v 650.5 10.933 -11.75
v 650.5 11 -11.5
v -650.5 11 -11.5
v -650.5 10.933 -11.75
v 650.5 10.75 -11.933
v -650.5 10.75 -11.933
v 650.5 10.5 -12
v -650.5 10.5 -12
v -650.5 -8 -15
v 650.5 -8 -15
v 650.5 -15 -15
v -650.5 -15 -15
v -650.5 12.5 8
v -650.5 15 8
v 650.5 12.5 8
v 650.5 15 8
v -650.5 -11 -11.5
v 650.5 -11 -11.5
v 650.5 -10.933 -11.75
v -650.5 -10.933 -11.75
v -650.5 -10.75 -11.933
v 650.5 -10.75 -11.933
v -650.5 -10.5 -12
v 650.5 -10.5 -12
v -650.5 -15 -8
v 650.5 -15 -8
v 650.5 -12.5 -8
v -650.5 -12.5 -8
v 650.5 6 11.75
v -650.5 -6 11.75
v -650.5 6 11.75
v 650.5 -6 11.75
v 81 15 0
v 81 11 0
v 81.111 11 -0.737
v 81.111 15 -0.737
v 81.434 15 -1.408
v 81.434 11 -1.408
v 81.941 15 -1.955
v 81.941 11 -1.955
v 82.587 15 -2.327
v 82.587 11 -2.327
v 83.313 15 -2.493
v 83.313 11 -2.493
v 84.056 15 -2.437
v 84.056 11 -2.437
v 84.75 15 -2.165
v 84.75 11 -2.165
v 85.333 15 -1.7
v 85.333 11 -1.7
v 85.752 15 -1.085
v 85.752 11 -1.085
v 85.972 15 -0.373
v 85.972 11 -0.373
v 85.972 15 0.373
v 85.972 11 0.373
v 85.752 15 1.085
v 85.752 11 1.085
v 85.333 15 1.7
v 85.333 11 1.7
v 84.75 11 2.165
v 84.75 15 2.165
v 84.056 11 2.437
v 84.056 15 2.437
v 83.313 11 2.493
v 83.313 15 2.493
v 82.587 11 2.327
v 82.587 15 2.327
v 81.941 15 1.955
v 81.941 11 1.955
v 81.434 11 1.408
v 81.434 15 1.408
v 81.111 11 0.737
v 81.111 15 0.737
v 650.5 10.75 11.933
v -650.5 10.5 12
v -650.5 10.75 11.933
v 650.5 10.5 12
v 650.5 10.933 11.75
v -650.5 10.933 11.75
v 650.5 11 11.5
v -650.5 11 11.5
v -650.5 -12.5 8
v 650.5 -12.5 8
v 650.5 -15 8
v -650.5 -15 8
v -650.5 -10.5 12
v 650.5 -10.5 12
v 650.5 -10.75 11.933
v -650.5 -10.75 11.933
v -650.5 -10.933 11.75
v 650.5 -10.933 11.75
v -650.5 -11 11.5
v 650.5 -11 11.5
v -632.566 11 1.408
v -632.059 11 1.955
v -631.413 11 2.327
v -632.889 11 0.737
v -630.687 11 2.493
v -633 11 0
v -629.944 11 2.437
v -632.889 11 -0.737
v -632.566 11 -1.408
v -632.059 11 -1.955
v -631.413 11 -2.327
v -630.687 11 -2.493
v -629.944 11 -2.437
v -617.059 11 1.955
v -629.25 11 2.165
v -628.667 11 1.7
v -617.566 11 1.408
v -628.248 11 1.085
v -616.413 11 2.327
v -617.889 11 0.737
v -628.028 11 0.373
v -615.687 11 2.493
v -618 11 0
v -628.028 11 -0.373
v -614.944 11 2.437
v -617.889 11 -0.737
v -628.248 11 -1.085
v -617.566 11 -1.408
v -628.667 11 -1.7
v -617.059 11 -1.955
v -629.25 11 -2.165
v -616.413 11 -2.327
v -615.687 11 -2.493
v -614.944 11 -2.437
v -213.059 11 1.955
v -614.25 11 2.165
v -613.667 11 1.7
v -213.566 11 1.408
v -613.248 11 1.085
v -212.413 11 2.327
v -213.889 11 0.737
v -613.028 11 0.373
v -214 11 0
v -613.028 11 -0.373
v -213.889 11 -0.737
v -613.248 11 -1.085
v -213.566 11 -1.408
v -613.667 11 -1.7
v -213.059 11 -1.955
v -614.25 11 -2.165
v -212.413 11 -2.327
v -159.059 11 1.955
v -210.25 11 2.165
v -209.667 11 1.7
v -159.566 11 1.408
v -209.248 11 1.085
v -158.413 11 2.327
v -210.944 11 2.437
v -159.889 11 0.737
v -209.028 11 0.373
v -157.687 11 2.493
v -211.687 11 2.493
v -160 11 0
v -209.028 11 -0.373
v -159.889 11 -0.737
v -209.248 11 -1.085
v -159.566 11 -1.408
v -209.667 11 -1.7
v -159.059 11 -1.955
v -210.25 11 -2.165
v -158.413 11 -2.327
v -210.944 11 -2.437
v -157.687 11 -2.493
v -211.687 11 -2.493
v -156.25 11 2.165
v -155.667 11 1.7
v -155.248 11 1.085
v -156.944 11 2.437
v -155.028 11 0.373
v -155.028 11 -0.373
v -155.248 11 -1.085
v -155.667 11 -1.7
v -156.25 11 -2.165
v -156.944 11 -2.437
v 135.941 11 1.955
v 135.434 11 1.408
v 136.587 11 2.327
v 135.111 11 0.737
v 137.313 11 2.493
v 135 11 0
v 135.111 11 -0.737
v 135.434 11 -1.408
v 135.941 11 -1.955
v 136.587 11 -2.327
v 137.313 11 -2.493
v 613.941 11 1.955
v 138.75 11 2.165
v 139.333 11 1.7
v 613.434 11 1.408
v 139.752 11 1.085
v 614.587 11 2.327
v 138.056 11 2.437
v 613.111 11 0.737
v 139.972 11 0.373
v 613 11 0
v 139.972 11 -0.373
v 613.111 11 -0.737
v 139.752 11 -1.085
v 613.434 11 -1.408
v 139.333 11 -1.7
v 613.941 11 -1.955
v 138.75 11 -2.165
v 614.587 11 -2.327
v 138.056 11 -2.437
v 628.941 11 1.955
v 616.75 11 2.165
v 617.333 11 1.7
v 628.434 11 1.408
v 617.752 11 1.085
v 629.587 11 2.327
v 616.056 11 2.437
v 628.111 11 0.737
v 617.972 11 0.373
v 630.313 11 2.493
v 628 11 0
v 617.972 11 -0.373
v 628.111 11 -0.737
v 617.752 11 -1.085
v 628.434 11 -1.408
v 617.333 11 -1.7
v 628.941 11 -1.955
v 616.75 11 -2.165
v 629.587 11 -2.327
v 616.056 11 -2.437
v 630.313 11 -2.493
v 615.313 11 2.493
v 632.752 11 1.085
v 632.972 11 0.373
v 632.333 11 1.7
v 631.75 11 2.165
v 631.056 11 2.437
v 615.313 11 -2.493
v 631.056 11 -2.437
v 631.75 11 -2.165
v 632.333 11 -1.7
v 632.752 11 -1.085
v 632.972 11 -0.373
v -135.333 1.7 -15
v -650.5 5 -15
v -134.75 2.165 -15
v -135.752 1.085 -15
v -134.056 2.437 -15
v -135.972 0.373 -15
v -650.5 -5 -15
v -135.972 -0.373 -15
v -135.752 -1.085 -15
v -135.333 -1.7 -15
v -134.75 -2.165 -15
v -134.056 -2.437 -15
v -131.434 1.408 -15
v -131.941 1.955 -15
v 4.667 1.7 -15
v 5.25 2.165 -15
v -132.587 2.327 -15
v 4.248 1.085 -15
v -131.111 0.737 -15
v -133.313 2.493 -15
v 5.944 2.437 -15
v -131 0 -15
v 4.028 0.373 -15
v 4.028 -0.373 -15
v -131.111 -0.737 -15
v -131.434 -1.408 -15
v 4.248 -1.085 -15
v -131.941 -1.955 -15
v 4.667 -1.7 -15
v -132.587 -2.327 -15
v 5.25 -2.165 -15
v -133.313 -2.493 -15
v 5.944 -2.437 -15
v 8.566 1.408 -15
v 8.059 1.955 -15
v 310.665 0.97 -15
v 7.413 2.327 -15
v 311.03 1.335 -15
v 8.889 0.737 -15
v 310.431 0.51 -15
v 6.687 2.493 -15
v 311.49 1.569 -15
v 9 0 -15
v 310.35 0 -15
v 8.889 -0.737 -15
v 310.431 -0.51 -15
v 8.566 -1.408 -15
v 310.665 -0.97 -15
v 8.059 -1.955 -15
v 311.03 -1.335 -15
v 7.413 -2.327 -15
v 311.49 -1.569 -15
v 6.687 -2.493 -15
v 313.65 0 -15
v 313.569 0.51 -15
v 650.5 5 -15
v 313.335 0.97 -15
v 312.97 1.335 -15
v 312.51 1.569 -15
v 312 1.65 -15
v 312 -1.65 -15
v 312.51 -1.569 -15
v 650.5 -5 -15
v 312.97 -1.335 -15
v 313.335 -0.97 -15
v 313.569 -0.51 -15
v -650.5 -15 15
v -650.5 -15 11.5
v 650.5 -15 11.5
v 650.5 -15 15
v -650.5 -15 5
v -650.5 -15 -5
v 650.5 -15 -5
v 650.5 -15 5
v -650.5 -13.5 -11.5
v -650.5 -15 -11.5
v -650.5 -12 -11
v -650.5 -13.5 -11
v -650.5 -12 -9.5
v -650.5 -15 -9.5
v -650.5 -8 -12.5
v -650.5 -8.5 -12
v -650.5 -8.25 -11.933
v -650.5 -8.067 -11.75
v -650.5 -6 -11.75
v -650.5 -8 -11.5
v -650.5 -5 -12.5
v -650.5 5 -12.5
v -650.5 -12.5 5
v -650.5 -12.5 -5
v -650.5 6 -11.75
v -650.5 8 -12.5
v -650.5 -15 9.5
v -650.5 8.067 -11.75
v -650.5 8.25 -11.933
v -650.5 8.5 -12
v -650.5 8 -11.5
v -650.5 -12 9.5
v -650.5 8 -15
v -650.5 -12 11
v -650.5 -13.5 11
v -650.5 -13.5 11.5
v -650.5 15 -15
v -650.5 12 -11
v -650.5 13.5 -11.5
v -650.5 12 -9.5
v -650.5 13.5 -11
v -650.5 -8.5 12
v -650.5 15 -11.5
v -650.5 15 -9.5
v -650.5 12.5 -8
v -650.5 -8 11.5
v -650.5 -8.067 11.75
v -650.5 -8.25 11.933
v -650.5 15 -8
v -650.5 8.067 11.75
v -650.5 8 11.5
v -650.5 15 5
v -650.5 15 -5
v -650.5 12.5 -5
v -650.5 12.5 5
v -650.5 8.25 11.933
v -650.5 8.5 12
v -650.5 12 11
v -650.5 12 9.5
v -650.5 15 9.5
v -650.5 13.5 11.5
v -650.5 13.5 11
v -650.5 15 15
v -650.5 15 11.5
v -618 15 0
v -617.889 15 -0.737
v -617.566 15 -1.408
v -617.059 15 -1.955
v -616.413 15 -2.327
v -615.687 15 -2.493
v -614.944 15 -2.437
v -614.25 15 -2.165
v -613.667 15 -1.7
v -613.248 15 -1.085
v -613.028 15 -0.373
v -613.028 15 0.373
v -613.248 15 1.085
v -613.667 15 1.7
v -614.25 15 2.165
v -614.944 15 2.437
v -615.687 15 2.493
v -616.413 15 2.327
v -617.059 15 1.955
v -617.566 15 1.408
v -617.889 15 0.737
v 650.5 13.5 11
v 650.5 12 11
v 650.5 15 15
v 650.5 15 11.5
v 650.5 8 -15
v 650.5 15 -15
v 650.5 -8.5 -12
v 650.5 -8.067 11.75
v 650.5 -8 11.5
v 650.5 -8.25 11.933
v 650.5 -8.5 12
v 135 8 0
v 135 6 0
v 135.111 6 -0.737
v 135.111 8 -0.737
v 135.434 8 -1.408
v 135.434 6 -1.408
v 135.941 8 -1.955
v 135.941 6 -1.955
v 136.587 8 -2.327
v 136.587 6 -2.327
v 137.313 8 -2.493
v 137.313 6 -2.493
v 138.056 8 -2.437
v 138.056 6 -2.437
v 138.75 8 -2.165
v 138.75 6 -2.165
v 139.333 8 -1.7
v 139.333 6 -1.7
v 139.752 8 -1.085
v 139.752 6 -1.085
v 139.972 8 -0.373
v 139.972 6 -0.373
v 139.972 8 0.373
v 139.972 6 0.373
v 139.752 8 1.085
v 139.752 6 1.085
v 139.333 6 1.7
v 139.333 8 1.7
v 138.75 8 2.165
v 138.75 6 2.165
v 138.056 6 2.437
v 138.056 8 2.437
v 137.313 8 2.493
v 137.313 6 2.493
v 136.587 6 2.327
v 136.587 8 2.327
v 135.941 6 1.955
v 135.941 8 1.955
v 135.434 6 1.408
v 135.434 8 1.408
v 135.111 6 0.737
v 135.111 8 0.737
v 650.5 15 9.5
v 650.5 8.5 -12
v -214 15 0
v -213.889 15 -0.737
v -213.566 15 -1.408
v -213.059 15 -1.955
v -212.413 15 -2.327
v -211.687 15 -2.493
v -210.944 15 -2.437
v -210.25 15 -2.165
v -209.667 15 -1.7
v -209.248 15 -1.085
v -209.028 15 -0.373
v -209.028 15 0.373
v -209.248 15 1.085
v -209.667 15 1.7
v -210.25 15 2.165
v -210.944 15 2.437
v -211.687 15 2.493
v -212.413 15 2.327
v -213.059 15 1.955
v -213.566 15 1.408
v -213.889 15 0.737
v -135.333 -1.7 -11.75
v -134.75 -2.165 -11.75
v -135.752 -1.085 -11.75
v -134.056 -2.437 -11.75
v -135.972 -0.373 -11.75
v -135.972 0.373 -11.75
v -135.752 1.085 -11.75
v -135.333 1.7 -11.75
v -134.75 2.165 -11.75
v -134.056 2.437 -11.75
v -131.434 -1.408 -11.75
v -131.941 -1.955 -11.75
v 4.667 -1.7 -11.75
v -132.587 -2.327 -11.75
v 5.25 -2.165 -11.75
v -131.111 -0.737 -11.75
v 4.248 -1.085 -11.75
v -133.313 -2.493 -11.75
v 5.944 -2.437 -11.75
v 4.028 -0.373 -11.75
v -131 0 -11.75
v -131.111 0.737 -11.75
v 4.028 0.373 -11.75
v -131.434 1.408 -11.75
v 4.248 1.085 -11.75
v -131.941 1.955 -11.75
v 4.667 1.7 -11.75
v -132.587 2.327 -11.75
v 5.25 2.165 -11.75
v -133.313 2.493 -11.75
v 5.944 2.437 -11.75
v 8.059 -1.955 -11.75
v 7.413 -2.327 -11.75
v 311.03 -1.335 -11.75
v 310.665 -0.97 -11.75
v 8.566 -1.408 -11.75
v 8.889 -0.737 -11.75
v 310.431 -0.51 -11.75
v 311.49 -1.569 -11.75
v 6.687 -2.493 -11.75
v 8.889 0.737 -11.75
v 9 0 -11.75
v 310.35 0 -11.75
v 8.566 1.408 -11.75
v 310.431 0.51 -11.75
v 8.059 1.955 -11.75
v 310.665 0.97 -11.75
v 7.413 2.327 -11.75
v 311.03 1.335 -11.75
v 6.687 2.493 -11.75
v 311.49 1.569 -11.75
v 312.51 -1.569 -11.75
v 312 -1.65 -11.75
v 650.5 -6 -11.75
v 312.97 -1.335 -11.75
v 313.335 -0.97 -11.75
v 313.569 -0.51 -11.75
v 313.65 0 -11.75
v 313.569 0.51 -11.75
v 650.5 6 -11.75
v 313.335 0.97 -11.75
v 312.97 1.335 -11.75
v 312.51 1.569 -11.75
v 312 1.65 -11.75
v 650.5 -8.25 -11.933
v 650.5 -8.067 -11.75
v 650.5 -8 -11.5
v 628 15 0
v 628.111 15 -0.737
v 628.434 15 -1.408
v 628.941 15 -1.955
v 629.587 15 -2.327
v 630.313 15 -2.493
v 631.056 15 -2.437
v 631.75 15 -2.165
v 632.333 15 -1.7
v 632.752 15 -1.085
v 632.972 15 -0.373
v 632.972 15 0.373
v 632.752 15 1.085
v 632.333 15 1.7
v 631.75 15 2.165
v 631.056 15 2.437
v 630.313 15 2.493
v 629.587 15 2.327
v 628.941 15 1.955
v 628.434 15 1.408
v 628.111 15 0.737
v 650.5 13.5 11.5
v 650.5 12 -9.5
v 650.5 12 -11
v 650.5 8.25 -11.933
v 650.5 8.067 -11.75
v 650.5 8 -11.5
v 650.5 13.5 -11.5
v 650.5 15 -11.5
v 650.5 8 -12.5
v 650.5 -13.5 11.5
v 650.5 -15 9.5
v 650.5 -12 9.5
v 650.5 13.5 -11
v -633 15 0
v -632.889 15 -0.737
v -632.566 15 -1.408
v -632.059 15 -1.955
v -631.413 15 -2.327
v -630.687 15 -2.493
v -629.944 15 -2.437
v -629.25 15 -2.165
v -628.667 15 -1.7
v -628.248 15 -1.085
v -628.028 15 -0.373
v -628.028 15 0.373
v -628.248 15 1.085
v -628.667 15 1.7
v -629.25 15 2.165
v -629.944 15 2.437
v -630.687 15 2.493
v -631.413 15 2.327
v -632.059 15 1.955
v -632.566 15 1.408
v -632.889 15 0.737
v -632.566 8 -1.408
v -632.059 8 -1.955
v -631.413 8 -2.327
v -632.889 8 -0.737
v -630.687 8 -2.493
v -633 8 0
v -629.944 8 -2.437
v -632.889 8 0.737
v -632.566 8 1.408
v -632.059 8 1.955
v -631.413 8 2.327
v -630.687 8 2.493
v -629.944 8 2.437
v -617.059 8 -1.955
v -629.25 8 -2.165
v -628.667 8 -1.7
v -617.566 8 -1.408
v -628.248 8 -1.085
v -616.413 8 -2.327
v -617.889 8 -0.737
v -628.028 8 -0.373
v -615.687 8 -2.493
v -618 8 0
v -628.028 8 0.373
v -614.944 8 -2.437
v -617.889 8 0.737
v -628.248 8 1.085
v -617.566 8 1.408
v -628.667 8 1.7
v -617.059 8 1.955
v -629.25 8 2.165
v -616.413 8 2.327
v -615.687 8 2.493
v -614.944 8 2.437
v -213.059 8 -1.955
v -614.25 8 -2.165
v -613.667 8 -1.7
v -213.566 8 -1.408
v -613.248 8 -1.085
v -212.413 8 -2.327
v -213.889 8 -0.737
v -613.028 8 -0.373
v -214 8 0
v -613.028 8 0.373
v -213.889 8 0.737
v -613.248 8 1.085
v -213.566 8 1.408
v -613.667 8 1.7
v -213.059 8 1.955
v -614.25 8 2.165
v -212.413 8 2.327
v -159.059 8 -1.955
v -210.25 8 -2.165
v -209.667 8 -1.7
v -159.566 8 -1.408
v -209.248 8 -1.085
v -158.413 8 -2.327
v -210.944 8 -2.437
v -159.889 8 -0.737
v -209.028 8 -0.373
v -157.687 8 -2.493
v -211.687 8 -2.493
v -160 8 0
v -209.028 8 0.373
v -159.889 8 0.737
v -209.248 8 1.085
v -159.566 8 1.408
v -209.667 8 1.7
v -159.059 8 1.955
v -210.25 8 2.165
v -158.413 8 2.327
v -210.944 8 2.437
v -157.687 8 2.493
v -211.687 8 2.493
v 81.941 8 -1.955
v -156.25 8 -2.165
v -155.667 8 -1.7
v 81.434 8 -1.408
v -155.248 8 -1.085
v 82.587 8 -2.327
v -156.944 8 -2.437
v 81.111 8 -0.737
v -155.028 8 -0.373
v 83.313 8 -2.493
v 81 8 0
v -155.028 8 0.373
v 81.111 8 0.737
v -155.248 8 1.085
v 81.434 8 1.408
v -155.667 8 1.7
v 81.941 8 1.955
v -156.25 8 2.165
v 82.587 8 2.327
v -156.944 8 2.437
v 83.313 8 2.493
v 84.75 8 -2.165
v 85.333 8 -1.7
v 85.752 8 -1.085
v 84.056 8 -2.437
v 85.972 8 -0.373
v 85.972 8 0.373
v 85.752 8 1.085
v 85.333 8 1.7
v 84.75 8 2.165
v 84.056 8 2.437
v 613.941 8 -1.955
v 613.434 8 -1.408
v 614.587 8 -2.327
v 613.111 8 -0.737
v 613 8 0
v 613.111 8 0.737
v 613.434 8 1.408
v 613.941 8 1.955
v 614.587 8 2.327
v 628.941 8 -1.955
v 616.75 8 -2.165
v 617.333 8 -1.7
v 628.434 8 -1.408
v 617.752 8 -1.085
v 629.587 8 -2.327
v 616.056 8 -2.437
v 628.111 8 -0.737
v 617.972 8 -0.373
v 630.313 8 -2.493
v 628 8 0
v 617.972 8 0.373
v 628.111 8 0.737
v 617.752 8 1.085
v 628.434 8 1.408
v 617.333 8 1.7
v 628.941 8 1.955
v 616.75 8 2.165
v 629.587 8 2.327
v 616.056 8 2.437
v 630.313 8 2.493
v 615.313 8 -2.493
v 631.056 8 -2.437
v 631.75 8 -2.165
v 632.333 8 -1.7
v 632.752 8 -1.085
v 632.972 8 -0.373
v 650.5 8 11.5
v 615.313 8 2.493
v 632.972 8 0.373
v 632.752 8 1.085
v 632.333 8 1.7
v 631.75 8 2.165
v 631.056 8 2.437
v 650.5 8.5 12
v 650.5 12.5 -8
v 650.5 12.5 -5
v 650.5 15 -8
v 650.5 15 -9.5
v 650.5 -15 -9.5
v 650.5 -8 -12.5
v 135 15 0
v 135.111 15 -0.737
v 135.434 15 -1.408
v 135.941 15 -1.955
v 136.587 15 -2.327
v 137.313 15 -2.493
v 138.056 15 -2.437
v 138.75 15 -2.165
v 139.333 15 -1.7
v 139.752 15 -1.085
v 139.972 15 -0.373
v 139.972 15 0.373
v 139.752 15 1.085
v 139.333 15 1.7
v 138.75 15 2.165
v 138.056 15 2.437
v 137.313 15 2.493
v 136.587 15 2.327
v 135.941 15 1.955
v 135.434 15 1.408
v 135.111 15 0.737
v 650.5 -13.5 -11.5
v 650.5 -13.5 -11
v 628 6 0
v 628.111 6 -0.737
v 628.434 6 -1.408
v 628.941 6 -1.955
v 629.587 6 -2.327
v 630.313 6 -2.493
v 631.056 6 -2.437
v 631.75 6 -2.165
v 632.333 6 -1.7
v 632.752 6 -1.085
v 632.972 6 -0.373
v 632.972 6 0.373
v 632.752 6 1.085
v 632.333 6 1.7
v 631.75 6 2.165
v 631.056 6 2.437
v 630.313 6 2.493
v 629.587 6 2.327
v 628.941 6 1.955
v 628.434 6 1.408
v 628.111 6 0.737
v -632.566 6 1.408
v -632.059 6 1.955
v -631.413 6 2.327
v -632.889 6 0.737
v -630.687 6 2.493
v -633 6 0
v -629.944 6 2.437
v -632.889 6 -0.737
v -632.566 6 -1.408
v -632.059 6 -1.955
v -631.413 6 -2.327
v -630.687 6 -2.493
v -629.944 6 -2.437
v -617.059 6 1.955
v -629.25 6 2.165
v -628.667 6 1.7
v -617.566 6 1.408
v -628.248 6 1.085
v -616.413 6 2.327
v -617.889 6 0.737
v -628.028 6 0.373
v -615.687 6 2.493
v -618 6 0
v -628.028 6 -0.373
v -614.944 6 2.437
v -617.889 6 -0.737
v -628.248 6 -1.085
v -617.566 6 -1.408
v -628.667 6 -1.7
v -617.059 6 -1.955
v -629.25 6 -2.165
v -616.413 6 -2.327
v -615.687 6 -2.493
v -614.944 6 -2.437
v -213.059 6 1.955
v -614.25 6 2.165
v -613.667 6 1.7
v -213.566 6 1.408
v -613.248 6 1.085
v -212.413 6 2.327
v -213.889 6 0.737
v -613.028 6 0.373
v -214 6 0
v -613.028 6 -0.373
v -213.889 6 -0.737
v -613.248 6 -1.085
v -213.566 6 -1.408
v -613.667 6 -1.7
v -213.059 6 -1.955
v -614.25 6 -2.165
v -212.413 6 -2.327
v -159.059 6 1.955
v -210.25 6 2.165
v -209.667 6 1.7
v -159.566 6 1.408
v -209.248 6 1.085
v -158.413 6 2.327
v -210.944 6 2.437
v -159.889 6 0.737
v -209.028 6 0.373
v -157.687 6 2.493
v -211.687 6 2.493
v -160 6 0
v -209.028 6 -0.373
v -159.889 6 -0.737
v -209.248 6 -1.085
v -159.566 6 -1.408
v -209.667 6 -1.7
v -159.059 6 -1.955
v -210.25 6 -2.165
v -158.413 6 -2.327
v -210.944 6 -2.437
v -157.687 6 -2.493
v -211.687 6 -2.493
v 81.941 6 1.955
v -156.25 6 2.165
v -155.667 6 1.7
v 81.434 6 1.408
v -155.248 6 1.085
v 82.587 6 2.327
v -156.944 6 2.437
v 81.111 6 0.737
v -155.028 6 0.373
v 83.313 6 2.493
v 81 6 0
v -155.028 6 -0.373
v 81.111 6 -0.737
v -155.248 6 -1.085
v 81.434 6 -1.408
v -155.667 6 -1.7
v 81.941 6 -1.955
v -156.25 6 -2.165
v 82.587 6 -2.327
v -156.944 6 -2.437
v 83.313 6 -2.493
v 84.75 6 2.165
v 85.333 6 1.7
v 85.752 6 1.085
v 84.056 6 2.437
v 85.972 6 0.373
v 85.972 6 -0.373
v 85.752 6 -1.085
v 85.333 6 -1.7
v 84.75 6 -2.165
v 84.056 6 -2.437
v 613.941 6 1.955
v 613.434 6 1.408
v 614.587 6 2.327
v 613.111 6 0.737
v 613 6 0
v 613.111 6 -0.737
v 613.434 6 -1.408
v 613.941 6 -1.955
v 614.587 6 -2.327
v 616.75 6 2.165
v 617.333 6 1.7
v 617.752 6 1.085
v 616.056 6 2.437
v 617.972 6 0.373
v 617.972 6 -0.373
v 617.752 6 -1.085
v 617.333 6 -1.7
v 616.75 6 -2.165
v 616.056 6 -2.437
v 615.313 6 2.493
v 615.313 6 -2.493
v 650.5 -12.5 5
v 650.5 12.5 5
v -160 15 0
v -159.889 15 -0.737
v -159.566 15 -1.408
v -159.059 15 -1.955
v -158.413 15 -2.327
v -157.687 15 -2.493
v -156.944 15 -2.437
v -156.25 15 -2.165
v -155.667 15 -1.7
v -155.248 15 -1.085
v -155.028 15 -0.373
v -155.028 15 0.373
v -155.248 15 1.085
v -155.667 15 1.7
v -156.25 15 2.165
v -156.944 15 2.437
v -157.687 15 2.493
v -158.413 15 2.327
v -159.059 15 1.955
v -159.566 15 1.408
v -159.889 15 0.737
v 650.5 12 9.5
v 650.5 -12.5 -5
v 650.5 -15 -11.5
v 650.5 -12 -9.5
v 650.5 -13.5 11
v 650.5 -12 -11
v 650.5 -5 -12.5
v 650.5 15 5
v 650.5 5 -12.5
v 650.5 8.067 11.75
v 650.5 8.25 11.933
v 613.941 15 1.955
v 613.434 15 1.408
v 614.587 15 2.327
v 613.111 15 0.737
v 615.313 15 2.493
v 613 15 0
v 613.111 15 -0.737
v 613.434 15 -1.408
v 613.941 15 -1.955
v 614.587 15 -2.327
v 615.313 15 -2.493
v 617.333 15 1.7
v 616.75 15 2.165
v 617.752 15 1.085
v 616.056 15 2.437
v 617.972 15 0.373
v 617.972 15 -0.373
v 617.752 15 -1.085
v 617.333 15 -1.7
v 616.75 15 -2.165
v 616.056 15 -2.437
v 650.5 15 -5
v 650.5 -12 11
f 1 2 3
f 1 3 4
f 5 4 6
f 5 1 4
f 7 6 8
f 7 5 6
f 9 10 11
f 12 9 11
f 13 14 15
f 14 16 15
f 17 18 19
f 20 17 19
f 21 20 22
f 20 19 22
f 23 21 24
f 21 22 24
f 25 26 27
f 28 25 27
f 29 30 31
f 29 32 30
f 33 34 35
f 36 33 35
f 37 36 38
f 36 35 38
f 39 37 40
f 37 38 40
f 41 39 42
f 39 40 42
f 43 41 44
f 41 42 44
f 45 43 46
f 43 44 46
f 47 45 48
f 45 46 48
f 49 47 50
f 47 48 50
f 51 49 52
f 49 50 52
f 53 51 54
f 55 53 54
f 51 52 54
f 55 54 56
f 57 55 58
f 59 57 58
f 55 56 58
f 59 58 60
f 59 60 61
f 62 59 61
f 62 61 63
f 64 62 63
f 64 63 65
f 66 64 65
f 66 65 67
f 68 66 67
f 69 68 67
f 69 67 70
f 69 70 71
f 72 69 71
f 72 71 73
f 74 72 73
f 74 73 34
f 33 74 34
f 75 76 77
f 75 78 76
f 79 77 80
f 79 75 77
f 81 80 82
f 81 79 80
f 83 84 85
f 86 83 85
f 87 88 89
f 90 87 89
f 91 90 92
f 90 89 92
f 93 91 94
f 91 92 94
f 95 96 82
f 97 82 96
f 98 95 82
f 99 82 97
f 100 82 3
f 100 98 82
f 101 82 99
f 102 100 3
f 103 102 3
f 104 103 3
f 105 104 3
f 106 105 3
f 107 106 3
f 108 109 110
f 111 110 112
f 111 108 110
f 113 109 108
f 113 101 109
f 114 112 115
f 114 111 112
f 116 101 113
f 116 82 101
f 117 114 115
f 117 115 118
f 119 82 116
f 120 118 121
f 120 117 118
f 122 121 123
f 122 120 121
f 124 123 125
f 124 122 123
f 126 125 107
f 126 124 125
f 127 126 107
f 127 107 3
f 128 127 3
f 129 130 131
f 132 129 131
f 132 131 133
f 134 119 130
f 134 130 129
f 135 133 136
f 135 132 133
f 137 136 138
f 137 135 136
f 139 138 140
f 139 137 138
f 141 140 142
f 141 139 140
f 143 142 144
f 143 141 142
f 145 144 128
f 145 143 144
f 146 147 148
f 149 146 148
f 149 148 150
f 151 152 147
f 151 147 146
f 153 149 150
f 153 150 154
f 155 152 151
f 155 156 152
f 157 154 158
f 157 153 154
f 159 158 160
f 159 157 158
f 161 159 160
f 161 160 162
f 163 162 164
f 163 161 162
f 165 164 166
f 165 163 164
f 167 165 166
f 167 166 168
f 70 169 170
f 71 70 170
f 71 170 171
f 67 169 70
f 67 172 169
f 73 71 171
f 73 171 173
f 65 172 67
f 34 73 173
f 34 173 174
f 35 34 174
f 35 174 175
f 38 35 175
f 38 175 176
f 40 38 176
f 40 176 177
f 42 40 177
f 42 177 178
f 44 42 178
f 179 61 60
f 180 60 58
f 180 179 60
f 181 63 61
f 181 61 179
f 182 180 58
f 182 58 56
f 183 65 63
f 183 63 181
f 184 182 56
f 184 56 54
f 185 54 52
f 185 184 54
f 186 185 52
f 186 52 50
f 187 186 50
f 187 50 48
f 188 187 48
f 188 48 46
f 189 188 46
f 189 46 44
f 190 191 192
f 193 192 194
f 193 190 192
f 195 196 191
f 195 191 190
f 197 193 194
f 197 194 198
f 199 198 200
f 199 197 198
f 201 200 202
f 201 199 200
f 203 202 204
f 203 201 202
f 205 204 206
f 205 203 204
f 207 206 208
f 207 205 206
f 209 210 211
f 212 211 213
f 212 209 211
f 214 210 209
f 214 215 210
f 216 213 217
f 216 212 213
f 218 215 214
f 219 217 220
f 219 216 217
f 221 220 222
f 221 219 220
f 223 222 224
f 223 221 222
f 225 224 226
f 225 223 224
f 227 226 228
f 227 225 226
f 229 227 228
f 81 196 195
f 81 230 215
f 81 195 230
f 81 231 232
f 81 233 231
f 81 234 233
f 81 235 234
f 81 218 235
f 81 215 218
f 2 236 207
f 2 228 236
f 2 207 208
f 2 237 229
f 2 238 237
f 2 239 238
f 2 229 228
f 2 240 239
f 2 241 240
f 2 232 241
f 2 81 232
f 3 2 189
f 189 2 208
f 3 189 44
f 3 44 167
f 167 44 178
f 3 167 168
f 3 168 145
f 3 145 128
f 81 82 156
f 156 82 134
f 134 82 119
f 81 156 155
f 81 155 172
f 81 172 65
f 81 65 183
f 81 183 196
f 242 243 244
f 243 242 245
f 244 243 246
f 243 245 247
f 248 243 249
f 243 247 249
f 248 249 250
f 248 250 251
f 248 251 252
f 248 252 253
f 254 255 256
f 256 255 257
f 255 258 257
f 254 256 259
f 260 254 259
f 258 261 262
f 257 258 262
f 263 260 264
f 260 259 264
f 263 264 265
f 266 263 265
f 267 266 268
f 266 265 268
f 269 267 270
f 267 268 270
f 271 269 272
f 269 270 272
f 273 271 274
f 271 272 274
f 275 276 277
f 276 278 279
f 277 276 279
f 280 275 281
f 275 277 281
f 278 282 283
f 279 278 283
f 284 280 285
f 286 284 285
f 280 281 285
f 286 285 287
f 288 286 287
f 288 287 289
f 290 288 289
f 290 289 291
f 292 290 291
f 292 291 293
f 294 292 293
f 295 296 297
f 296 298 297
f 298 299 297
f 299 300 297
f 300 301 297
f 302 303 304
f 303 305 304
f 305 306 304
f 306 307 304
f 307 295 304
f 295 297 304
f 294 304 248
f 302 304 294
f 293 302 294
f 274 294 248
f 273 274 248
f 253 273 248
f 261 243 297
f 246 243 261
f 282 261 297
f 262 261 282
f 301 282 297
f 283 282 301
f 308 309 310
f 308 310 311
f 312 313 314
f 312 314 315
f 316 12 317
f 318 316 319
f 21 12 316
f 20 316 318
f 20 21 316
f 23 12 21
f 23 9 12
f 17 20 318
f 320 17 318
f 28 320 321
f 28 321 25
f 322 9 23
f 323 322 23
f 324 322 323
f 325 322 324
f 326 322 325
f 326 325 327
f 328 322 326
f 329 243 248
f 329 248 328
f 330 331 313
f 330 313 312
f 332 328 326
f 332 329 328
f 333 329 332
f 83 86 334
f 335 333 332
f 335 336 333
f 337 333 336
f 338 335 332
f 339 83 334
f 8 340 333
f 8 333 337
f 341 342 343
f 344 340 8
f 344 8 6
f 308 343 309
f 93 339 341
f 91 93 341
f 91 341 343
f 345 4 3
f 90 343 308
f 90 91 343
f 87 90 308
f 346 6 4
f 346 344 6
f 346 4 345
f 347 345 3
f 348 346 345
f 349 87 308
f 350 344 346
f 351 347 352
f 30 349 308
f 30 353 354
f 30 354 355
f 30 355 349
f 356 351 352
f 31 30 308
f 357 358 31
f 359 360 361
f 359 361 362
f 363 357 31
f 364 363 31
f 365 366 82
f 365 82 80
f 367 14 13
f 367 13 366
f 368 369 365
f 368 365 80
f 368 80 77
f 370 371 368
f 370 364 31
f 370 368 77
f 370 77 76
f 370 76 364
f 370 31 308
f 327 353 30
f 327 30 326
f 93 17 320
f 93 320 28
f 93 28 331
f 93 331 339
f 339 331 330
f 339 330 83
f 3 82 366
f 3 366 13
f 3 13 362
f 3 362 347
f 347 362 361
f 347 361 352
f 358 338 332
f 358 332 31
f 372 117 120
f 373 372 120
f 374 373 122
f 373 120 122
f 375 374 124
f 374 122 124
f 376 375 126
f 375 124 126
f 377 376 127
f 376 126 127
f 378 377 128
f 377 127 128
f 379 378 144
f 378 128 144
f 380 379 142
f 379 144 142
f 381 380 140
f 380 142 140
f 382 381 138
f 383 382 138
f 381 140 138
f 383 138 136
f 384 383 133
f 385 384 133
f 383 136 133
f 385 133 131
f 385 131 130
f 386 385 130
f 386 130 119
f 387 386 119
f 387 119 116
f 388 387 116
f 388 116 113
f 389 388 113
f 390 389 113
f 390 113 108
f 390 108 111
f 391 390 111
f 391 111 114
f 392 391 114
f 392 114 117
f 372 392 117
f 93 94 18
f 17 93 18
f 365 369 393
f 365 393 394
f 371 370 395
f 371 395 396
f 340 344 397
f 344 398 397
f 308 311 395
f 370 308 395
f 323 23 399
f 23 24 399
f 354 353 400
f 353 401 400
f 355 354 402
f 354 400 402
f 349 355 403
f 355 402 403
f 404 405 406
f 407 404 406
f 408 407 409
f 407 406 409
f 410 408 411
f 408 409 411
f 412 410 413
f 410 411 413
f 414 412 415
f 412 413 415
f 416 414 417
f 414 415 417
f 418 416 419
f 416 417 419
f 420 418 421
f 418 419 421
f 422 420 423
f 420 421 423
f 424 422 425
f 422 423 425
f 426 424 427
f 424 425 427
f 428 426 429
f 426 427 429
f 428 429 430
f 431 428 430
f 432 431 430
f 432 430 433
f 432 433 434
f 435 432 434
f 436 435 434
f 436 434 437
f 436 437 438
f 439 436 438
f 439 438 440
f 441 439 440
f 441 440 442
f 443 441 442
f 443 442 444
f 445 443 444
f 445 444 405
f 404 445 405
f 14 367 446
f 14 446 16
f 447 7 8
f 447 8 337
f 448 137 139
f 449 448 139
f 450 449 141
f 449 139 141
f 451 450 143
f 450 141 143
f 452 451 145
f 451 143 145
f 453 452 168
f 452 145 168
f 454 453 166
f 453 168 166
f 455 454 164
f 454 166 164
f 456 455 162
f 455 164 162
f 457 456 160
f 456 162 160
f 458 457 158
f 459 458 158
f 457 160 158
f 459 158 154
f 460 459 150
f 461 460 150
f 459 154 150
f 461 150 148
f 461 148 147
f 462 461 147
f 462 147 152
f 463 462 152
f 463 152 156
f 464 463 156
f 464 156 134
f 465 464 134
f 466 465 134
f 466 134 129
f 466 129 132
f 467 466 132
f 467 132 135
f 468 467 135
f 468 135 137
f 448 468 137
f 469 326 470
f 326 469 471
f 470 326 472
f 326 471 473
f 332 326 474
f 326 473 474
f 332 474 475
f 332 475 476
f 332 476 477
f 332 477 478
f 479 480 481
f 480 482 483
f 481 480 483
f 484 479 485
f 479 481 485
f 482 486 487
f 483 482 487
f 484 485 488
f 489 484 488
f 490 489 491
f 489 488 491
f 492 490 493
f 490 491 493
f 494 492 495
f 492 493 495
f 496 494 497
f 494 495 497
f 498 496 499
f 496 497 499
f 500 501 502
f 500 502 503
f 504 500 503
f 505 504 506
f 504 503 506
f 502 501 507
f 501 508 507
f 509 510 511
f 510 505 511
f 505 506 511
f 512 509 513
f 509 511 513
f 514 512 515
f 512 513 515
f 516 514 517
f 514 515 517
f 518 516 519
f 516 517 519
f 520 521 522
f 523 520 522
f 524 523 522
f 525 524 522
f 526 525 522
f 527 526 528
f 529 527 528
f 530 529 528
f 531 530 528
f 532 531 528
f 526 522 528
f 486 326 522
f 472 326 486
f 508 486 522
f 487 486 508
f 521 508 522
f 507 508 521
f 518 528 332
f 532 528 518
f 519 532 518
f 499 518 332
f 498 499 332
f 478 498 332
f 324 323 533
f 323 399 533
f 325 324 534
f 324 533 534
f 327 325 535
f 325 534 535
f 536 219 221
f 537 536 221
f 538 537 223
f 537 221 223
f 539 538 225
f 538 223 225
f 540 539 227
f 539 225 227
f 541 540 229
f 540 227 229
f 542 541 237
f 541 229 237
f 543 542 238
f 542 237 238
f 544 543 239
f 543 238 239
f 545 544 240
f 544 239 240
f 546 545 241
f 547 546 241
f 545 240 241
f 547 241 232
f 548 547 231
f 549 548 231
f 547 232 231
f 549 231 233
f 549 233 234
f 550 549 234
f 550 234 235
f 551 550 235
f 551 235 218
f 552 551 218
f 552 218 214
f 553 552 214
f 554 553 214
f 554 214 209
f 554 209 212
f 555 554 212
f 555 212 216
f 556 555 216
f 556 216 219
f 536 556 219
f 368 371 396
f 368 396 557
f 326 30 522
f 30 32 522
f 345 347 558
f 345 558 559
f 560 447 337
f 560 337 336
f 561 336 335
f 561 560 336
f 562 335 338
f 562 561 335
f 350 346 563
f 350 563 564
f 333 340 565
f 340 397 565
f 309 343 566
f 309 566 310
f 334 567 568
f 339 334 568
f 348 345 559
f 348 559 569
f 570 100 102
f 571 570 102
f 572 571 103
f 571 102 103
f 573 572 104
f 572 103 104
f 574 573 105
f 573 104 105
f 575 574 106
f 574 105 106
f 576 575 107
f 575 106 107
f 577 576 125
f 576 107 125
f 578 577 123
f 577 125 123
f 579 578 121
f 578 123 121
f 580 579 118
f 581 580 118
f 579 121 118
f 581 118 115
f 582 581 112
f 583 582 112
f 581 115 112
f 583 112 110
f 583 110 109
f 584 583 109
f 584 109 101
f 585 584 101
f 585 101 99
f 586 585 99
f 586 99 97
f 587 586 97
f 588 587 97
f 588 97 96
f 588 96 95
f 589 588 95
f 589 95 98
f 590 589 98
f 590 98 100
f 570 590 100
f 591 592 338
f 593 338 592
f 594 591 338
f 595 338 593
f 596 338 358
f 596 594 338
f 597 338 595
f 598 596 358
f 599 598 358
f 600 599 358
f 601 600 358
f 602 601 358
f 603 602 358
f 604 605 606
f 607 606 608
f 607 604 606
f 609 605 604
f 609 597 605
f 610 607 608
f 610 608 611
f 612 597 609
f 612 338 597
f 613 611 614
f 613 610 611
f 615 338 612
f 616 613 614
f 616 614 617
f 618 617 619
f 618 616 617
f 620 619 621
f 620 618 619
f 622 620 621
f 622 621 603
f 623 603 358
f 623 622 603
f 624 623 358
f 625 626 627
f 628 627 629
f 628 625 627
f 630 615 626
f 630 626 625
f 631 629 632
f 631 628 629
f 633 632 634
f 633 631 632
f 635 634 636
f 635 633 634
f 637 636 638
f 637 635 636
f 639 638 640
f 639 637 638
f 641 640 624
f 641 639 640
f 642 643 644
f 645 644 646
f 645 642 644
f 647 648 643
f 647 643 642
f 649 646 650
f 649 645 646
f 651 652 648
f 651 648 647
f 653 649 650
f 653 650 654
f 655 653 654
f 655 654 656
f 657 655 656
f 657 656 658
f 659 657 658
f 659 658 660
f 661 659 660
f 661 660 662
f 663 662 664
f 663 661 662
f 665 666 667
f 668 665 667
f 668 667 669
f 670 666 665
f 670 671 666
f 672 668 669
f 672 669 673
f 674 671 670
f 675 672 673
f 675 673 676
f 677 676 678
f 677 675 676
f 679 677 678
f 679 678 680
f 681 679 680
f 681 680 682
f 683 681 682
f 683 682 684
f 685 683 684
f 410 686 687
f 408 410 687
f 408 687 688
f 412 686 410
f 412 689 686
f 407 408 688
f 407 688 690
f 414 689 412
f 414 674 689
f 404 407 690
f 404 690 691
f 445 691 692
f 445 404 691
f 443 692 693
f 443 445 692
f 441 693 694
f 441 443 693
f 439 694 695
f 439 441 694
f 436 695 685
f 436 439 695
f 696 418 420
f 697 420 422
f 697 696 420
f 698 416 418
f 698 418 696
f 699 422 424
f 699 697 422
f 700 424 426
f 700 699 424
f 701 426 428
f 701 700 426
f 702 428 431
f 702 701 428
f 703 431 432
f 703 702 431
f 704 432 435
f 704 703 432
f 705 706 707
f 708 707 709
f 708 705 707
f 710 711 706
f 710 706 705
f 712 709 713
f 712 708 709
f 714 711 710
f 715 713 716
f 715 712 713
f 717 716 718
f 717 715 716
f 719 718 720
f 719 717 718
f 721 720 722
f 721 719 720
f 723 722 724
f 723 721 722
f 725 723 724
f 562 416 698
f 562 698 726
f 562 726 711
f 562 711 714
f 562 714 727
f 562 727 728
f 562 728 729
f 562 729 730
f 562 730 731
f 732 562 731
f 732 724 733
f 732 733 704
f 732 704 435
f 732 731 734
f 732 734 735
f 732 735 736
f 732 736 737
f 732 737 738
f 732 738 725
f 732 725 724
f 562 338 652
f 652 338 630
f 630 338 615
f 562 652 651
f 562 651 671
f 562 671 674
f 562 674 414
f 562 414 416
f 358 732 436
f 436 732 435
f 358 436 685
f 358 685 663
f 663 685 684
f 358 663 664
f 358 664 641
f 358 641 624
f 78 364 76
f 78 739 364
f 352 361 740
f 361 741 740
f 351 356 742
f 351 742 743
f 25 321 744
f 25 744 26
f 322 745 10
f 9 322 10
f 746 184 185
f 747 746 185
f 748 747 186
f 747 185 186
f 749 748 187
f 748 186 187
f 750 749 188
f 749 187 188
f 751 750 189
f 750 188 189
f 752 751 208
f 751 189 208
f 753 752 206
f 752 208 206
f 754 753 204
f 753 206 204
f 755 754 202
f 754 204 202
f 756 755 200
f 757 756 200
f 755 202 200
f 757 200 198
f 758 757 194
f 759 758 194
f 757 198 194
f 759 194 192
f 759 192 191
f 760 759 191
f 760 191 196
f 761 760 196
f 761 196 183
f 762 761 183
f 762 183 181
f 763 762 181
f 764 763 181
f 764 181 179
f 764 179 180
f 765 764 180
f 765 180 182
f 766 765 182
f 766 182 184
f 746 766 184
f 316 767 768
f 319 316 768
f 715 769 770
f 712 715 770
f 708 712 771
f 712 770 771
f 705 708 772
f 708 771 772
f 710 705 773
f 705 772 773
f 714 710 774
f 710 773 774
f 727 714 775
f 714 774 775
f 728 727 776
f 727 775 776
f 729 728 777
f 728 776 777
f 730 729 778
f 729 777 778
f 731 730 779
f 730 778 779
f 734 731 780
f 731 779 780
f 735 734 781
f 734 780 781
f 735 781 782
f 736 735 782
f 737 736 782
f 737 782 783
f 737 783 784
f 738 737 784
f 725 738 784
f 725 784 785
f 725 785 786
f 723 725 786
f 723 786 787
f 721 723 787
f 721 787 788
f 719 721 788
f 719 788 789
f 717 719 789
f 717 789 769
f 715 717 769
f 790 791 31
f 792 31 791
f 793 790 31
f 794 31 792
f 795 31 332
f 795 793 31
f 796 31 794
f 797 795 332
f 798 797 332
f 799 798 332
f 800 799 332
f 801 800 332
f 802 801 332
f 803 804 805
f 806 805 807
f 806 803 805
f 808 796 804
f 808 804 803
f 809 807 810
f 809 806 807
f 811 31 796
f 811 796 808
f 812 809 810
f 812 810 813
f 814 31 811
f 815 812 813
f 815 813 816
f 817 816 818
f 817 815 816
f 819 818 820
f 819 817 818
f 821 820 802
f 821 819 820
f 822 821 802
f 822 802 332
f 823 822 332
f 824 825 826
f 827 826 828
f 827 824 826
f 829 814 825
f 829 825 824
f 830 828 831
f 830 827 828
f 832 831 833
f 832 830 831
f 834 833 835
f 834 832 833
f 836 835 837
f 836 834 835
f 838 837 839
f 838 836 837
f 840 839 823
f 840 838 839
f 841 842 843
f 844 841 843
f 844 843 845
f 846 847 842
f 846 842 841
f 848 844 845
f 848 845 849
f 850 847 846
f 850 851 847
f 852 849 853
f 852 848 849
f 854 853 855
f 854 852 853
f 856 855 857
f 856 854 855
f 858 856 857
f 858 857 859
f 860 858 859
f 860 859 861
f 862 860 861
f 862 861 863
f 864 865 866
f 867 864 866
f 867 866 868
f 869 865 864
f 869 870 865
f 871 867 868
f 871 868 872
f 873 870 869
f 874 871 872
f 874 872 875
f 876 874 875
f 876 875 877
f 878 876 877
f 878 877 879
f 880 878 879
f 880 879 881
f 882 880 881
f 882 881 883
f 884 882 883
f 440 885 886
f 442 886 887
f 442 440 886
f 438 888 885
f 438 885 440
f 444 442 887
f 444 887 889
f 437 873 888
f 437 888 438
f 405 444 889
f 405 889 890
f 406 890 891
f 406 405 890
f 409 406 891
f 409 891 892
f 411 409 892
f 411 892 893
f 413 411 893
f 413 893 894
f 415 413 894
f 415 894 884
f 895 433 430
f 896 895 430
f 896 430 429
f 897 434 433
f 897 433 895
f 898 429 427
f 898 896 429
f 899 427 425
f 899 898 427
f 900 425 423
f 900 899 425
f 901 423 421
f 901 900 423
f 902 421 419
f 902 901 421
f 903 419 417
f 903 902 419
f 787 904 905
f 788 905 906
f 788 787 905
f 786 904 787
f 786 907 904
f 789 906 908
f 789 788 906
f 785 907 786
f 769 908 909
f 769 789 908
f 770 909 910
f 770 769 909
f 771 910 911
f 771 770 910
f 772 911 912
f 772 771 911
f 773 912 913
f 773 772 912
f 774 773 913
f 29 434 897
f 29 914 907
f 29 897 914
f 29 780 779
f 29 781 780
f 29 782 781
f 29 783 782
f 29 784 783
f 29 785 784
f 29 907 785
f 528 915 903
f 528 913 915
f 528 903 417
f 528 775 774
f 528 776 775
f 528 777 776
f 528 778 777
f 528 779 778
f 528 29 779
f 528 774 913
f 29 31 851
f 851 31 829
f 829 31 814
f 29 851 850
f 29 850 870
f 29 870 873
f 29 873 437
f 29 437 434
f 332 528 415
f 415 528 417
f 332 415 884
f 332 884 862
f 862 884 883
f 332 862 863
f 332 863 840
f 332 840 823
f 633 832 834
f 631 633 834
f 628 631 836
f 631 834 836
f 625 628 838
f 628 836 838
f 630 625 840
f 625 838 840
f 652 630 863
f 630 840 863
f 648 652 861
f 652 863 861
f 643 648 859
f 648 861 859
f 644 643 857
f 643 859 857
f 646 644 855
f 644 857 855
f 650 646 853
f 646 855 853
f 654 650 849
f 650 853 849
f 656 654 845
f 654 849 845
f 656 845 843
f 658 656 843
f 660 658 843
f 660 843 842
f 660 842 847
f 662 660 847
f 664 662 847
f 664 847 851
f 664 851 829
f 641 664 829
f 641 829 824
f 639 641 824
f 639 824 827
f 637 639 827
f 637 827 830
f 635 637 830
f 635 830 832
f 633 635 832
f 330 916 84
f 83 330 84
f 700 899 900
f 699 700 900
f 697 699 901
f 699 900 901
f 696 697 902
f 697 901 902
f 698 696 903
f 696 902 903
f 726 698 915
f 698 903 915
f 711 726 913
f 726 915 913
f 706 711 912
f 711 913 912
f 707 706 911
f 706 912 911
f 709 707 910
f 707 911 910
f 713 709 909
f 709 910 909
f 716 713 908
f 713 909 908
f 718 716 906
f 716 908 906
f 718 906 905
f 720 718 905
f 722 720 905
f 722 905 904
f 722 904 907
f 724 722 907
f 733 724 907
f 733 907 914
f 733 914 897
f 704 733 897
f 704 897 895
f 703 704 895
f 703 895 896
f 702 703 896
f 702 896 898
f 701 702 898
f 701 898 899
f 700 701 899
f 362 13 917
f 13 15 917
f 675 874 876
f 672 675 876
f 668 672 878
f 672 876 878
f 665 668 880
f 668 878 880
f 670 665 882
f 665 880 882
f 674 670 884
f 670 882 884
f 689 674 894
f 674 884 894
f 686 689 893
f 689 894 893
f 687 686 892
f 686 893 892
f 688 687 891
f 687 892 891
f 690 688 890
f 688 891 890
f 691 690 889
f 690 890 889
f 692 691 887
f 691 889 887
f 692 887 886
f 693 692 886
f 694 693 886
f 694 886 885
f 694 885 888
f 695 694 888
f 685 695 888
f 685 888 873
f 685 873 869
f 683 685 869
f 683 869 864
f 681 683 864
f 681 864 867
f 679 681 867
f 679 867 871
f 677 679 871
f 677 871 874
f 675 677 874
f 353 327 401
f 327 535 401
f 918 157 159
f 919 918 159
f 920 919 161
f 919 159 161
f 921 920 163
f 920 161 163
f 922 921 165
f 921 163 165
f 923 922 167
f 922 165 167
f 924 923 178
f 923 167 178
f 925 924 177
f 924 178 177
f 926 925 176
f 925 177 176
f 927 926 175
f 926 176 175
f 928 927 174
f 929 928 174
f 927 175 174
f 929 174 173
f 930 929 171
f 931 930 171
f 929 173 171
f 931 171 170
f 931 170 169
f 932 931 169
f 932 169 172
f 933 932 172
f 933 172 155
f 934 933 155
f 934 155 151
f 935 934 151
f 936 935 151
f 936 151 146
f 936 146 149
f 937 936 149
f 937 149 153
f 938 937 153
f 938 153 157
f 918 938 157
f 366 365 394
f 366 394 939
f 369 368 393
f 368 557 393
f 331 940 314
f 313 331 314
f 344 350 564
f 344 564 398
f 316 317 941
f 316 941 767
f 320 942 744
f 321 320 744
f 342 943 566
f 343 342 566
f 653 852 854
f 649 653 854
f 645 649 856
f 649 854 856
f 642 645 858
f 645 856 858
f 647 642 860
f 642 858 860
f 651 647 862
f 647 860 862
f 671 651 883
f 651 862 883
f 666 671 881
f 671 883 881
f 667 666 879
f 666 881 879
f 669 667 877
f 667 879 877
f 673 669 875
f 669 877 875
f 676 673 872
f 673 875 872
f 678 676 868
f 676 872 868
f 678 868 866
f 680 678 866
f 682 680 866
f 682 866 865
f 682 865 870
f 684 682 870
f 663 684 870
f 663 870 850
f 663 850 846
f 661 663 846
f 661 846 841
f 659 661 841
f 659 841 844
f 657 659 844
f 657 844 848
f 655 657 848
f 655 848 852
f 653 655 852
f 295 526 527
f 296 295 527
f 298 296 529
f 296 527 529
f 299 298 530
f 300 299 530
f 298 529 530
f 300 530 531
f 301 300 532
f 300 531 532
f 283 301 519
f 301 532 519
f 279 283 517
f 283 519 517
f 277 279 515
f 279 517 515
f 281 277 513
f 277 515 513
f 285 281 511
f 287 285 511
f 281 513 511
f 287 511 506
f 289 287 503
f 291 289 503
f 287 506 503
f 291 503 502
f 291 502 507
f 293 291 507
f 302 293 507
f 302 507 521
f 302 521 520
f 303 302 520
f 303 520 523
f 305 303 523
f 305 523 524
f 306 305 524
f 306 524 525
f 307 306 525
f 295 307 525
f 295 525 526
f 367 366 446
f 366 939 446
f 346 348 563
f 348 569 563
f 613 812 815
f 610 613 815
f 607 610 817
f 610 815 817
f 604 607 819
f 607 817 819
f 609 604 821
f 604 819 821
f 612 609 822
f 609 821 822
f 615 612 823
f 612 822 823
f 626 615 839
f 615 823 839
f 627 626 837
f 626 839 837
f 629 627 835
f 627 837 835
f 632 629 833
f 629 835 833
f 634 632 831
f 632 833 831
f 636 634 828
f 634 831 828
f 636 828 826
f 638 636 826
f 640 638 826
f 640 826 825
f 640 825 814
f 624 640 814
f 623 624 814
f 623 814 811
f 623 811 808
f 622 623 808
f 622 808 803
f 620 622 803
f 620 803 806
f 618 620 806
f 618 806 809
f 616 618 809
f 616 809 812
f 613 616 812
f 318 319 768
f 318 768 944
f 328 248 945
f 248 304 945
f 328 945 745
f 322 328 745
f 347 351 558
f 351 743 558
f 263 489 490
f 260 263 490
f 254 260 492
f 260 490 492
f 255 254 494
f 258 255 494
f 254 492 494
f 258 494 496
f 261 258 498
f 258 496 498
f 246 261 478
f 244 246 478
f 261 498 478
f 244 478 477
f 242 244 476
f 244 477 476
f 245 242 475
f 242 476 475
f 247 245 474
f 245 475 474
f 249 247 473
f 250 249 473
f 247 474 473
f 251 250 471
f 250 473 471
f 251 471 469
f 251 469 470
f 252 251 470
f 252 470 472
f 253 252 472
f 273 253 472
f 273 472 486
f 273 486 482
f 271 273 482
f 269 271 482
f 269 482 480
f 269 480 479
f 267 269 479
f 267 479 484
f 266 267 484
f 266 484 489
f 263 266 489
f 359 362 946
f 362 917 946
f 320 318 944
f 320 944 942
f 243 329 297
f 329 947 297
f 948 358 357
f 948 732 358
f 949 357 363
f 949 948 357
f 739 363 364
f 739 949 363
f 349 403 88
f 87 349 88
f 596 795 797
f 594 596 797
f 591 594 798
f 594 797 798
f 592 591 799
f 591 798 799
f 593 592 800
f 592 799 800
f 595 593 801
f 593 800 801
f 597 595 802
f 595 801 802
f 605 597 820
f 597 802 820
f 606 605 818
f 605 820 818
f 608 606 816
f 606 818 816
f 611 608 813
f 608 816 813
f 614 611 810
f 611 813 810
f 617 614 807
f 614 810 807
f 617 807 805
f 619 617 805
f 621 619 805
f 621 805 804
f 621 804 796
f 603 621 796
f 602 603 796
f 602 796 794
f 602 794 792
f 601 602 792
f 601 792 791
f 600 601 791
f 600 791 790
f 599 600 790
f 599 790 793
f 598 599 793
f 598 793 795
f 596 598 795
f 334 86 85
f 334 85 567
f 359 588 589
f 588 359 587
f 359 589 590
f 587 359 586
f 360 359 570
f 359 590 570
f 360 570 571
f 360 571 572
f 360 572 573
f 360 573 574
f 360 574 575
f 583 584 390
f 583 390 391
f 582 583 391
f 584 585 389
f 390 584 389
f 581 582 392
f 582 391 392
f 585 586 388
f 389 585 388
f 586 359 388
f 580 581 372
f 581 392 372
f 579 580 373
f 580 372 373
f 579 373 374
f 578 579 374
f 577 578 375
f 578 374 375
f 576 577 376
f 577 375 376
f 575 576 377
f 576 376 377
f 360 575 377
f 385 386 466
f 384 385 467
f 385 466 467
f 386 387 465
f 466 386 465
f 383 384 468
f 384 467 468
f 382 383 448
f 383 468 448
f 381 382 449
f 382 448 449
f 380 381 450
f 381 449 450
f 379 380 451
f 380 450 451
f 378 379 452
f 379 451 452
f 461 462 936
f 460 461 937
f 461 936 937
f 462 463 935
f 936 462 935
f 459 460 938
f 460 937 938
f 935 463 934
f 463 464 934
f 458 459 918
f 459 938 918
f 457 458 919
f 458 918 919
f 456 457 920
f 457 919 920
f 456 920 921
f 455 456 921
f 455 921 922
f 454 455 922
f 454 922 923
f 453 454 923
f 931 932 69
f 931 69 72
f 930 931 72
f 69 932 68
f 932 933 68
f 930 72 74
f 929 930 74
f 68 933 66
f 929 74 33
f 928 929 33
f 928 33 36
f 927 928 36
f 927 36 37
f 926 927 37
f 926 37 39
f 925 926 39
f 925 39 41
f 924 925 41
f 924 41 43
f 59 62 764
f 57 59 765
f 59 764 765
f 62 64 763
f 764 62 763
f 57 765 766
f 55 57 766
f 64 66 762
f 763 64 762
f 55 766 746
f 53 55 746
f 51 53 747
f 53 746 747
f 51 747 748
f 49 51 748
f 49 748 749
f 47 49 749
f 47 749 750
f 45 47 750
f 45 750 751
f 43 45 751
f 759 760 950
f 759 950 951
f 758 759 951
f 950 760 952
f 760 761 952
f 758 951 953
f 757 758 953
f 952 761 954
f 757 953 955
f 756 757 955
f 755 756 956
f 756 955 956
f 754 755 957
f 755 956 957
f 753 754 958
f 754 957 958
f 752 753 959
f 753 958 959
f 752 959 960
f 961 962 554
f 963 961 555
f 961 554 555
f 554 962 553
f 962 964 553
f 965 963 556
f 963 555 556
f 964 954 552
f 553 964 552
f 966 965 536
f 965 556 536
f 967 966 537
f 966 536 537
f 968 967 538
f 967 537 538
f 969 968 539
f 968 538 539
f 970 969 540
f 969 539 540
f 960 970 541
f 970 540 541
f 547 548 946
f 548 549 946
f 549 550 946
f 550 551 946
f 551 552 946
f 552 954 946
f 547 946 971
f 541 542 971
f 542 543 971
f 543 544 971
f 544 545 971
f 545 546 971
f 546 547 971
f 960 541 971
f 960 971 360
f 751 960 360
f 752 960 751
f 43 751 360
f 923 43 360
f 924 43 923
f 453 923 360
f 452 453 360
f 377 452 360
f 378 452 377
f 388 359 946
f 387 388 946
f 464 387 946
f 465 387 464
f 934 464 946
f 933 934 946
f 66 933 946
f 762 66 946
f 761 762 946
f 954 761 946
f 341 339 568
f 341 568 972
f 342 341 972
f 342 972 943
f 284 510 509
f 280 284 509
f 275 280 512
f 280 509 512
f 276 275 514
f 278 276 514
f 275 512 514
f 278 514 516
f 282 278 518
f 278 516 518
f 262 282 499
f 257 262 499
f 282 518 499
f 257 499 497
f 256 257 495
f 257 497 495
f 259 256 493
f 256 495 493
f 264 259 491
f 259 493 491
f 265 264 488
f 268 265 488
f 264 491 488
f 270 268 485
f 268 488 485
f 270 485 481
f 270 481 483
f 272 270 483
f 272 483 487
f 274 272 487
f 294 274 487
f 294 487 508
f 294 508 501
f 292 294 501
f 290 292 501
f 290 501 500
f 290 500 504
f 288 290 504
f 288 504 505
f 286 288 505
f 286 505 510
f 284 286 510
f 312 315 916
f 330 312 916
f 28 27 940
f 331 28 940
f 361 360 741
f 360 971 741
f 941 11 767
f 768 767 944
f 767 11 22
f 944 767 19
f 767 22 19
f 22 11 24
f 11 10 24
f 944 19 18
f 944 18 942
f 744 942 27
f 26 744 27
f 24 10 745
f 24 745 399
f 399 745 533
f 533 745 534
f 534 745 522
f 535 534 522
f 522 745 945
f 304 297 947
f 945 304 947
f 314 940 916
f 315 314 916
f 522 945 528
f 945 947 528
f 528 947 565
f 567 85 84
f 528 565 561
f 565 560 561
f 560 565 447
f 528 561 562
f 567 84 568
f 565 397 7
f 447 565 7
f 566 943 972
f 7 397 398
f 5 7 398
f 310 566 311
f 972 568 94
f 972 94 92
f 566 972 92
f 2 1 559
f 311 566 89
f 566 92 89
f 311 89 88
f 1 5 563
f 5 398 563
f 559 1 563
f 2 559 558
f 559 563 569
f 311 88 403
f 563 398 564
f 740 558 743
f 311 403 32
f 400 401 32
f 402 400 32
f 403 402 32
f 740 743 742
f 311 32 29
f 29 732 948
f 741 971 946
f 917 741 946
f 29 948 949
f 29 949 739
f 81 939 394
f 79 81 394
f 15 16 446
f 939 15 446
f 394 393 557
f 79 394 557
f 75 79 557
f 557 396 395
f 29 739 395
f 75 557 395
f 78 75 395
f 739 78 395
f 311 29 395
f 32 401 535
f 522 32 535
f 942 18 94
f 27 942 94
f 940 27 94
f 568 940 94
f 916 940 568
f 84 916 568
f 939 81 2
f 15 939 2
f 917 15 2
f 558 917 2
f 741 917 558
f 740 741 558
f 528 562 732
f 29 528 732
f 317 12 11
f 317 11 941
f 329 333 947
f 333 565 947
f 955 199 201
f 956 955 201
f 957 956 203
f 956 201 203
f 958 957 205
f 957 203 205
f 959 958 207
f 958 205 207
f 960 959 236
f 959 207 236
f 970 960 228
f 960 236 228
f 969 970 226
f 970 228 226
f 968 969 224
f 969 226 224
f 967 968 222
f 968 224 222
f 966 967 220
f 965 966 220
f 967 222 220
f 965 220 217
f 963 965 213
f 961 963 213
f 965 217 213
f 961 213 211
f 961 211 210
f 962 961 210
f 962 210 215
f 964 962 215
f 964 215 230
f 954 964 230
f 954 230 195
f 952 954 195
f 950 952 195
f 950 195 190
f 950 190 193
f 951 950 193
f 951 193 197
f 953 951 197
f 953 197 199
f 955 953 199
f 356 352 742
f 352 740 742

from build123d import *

# Parameters (mm, degrees)
SKETCH_1_W             = 23.5
SKETCH_1_H             = 12
EXTRUDE_1_DEPTH        = 650.5
HOLE_WIZARD_M6_1_D     = 5
HOLE_WIZARD_M6_1_DEPTH = 19
HOLE_WIZARD_M6_1_TIP   = 1.502151548
HOLE_WIZARD_M6_2_D     = 5
HOLE_WIZARD_M6_2_DEPTH = 19
HOLE_WIZARD_M6_2_TIP   = 1.502151548
HOLE_WIZARD_M4_1_D     = 3.3
HOLE_WIZARD_M4_1_DEPTH = 11.5
HOLE_WIZARD_M4_1_TIP   = 0.991420021


with BuildPart() as part:
    # 草图1 → 凸台-拉伸1 (new, symmetric)
    with BuildSketch(Plane(origin=(0, 0, 0), x_dir=(0, 0, -1), z_dir=(1, 0, 0))):
        Polygon((-15, 15), (-11.5, 15), (-11.5, 13.5), (-11, 13.5), (-11, 12), (-9.5, 12), (-9.5, 15), (-8, 15), (-8, 12.5), (-5, 12.5), (-5, 15), (5, 15), (5, 12.5), (8, 12.5), (8, 15), (9.5, 15), (9.5, 12), (11, 12), (11, 13.5), (11.5, 13.5), (11.5, 15), (15, 15), (15, 8), (12.5, 8), (12.5, 5), (15, 5), (15, -5), (12.5, -5), (12.5, -8), (15, -8), (15, -15), (11.5, -15), (11.5, -13.5), (11, -13.5), (11, -12), (9.5, -12), (9.5, -15), (8, -15), (8, -12.5), (5, -12.5), (5, -15), (-5, -15), (-5, -12.5), (-8, -12.5), (-8, -15), (-9.5, -15), (-9.5, -12), (-11, -12), (-11, -13.5), (-11.5, -13.5), (-11.5, -15), (-15, -15), align=None)
        with BuildLine():
            Line((12, -10.5), (12, -8.5))
            ThreePointArc((12, -8.5), (11.853553391, -8.146446609), (11.5, -8))
            Line((11.5, -8), (-11.5, -8))
            ThreePointArc((-11.5, -8), (-11.853553391, -8.146446609), (-12, -8.5))
            Line((-12, -8.5), (-12, -10.5))
            ThreePointArc((-12, -10.5), (-11.853553391, -10.853553391), (-11.5, -11))
            Line((-11.5, -11), (11.5, -11))
            ThreePointArc((11.5, -11), (11.853553391, -10.853553391), (12, -10.5))
        make_face(mode=Mode.SUBTRACT)
        with BuildLine():
            Line((-11.5, 11), (11.5, 11))
            ThreePointArc((11.5, 11), (11.853553391, 10.853553391), (12, 10.5))
            Line((12, 10.5), (12, 8.5))
            ThreePointArc((12, 8.5), (11.853553391, 8.146446609), (11.5, 8))
            Line((11.5, 8), (-11.5, 8))
            ThreePointArc((-11.5, 8), (-11.853553391, 8.146446609), (-12, 8.5))
            Line((-12, 8.5), (-12, 10.5))
            ThreePointArc((-12, 10.5), (-11.853553391, 10.853553391), (-11.5, 11))
        make_face(mode=Mode.SUBTRACT)
        Rectangle(SKETCH_1_W, SKETCH_1_H, mode=Mode.SUBTRACT)
    extrude(amount=EXTRUDE_1_DEPTH, both=True)

    # M6 螺纹孔1
    with Locations(Plane(origin=(0, 15, 0), x_dir=(1, 0, 0), z_dir=(0, 1, 0))):
        with Locations((-630.5, 0), (-615.5, 0), (615.5, 0), (630.5, 0), (-211.5, 0), (-157.5, 0), (83.5, 0), (137.5, 0)):
            Hole(HOLE_WIZARD_M6_1_D / 2, depth=HOLE_WIZARD_M6_1_DEPTH)
            with Locations((0, 0, -(HOLE_WIZARD_M6_1_DEPTH + HOLE_WIZARD_M6_1_TIP / 2))):  # 118° drill point
                Cone(0, HOLE_WIZARD_M6_1_D / 2, HOLE_WIZARD_M6_1_TIP, mode=Mode.SUBTRACT)

    # M6 螺纹孔2
    with Locations(Plane(origin=(0, 0, -15), x_dir=(-1, 0, 0), z_dir=(0, 0, -1))):
        with Locations((133.5, 0), (-6.5, 0)):
            Hole(HOLE_WIZARD_M6_2_D / 2, depth=HOLE_WIZARD_M6_2_DEPTH)
            with Locations((0, 0, -(HOLE_WIZARD_M6_2_DEPTH + HOLE_WIZARD_M6_2_TIP / 2))):  # 118° drill point
                Cone(0, HOLE_WIZARD_M6_2_D / 2, HOLE_WIZARD_M6_2_TIP, mode=Mode.SUBTRACT)

    # M4 螺纹孔1
    with Locations(Plane(origin=(0, 0, -15), x_dir=(-1, 0, 0), z_dir=(0, 0, -1))):
        with Locations((-312, 0)):
            Hole(HOLE_WIZARD_M4_1_D / 2, depth=HOLE_WIZARD_M4_1_DEPTH)
            with Locations((0, 0, -(HOLE_WIZARD_M4_1_DEPTH + HOLE_WIZARD_M4_1_TIP / 2))):  # 118° drill point
                Cone(0, HOLE_WIZARD_M4_1_D / 2, HOLE_WIZARD_M4_1_TIP, mode=Mode.SUBTRACT)


solid = part.part
